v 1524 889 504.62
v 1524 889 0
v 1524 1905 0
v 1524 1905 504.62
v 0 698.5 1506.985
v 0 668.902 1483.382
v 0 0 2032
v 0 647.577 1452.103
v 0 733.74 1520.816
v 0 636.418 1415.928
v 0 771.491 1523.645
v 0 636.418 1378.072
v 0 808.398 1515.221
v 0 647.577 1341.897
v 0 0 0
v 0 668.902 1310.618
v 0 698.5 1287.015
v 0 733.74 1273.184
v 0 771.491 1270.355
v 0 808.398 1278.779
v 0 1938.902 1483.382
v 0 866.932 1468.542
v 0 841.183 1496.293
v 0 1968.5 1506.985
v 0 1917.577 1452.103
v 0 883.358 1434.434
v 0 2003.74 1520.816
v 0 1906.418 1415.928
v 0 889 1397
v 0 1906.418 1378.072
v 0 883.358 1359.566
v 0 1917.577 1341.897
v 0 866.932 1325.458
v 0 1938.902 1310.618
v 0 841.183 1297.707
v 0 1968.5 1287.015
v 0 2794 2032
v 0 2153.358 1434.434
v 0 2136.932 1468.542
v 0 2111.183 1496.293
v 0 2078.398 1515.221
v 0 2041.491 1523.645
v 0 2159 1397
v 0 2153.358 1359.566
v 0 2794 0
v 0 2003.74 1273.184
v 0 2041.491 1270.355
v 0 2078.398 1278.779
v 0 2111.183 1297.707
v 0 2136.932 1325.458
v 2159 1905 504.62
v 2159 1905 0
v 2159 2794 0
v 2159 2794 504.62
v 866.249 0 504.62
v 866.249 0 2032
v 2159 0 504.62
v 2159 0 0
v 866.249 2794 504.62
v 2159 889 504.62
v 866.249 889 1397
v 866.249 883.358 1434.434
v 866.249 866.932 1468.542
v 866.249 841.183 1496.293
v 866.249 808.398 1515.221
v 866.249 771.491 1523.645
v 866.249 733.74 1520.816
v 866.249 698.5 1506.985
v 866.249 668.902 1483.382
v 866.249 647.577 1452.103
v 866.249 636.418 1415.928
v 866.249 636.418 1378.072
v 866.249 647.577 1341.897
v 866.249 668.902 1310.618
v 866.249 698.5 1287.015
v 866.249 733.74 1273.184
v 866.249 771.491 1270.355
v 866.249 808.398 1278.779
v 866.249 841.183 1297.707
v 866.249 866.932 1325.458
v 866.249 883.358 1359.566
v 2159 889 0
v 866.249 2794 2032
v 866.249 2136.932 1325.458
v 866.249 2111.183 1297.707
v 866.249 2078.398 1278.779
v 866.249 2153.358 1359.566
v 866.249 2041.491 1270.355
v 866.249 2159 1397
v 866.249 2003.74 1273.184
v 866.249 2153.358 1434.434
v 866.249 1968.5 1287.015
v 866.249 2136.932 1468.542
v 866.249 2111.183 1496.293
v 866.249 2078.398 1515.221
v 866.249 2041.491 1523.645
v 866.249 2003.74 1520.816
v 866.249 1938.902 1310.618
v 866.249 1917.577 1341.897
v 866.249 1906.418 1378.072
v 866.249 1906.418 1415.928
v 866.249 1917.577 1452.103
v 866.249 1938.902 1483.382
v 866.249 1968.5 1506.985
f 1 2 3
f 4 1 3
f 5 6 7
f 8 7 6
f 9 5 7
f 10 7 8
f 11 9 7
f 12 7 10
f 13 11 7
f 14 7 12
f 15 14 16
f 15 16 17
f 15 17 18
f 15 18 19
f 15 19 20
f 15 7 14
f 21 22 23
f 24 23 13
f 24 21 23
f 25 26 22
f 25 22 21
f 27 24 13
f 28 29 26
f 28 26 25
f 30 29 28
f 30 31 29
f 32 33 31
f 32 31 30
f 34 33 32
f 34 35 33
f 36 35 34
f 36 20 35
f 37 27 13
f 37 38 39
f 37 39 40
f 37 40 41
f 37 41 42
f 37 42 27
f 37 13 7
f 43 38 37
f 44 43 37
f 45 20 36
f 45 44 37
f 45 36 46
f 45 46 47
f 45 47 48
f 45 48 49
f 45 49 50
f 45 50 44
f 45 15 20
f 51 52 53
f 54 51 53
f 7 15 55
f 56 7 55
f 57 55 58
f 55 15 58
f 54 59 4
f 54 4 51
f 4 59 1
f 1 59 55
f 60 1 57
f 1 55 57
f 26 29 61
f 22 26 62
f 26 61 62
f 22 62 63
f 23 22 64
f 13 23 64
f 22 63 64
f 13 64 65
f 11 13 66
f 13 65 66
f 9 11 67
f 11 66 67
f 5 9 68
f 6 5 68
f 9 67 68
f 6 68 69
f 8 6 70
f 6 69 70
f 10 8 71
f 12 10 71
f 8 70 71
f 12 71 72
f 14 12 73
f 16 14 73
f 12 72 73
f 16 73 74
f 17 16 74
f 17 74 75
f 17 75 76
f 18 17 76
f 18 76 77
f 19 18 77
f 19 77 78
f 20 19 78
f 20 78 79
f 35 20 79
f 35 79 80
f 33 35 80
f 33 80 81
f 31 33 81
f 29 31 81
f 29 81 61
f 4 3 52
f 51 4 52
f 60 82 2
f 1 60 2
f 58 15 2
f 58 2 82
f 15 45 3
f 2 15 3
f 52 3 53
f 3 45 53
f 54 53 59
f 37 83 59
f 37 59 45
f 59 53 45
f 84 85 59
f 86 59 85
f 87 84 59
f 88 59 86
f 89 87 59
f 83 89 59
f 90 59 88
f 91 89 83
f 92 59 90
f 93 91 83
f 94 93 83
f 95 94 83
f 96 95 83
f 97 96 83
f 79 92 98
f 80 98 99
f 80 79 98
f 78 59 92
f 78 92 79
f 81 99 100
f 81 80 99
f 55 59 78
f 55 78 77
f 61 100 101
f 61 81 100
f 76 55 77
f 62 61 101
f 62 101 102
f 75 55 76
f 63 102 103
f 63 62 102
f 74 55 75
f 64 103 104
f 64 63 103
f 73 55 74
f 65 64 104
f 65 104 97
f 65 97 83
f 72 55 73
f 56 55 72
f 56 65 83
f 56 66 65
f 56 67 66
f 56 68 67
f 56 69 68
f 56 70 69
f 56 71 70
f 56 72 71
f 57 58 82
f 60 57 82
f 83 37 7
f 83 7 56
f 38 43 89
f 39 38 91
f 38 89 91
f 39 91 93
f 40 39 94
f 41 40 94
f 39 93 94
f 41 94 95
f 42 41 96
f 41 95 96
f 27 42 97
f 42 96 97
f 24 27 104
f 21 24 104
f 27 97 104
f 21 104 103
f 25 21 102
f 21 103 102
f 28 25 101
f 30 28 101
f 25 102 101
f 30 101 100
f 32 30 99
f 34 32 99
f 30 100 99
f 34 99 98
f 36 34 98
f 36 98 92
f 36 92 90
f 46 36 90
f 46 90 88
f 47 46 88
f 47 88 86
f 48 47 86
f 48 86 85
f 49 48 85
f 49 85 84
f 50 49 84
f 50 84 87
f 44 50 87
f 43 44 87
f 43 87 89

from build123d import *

# Parameters (mm, degrees)
F0_W     = 635
F0_H     = 2794
F1_DEPTH = 2032
F2_W     = 644.319852829
F2_H     = 1527.3802227974
F3_DEPTH = 2794.001
F4_R     = 127
F5_DEPTH = 1514.681147171
F6_W     = 648.431122303
F6_H     = 1527.3802227974
F7_DEPTH = 2794.001


with BuildPart() as f1:
    # F0 (on Top) → F1 (new body)
    with BuildSketch(Plane.XY):
        with Locations((317.5, 1397)):
            Rectangle(F0_W, F0_H)
        Polygon((635, 2794), (635, 0), (2159, 0), (2159, 889), (1524, 889), (1524, 1905), (2159, 1905), (2159, 2794), align=None)
    extrude(amount=F1_DEPTH)

    # F2 (on face) → F3 (cut, through all)
    with BuildSketch(Plane.XZ):
        with Locations((1836.8400735855, 1268.3098886013)):
            Rectangle(F2_W, F2_H)
    extrude(amount=-F3_DEPTH, mode=Mode.SUBTRACT)

    # F4 (on face) → F5 (cut, through all)
    with BuildSketch(Plane.YZ.offset(1514.680147171)):
        with Locations((2032, 1397)):
            Circle(F4_R)
        with Locations((762, 1397)):
            Circle(F4_R)
    extrude(amount=-F5_DEPTH, mode=Mode.SUBTRACT)

    # F6 (on face) → F7 (cut, through all)
    with BuildSketch(Plane.XZ):
        with Locations((1190.4645860195, 1268.3098886013)):
            Rectangle(F6_W, F6_H)
    extrude(amount=-F7_DEPTH, mode=Mode.SUBTRACT)


solid = f1.part
